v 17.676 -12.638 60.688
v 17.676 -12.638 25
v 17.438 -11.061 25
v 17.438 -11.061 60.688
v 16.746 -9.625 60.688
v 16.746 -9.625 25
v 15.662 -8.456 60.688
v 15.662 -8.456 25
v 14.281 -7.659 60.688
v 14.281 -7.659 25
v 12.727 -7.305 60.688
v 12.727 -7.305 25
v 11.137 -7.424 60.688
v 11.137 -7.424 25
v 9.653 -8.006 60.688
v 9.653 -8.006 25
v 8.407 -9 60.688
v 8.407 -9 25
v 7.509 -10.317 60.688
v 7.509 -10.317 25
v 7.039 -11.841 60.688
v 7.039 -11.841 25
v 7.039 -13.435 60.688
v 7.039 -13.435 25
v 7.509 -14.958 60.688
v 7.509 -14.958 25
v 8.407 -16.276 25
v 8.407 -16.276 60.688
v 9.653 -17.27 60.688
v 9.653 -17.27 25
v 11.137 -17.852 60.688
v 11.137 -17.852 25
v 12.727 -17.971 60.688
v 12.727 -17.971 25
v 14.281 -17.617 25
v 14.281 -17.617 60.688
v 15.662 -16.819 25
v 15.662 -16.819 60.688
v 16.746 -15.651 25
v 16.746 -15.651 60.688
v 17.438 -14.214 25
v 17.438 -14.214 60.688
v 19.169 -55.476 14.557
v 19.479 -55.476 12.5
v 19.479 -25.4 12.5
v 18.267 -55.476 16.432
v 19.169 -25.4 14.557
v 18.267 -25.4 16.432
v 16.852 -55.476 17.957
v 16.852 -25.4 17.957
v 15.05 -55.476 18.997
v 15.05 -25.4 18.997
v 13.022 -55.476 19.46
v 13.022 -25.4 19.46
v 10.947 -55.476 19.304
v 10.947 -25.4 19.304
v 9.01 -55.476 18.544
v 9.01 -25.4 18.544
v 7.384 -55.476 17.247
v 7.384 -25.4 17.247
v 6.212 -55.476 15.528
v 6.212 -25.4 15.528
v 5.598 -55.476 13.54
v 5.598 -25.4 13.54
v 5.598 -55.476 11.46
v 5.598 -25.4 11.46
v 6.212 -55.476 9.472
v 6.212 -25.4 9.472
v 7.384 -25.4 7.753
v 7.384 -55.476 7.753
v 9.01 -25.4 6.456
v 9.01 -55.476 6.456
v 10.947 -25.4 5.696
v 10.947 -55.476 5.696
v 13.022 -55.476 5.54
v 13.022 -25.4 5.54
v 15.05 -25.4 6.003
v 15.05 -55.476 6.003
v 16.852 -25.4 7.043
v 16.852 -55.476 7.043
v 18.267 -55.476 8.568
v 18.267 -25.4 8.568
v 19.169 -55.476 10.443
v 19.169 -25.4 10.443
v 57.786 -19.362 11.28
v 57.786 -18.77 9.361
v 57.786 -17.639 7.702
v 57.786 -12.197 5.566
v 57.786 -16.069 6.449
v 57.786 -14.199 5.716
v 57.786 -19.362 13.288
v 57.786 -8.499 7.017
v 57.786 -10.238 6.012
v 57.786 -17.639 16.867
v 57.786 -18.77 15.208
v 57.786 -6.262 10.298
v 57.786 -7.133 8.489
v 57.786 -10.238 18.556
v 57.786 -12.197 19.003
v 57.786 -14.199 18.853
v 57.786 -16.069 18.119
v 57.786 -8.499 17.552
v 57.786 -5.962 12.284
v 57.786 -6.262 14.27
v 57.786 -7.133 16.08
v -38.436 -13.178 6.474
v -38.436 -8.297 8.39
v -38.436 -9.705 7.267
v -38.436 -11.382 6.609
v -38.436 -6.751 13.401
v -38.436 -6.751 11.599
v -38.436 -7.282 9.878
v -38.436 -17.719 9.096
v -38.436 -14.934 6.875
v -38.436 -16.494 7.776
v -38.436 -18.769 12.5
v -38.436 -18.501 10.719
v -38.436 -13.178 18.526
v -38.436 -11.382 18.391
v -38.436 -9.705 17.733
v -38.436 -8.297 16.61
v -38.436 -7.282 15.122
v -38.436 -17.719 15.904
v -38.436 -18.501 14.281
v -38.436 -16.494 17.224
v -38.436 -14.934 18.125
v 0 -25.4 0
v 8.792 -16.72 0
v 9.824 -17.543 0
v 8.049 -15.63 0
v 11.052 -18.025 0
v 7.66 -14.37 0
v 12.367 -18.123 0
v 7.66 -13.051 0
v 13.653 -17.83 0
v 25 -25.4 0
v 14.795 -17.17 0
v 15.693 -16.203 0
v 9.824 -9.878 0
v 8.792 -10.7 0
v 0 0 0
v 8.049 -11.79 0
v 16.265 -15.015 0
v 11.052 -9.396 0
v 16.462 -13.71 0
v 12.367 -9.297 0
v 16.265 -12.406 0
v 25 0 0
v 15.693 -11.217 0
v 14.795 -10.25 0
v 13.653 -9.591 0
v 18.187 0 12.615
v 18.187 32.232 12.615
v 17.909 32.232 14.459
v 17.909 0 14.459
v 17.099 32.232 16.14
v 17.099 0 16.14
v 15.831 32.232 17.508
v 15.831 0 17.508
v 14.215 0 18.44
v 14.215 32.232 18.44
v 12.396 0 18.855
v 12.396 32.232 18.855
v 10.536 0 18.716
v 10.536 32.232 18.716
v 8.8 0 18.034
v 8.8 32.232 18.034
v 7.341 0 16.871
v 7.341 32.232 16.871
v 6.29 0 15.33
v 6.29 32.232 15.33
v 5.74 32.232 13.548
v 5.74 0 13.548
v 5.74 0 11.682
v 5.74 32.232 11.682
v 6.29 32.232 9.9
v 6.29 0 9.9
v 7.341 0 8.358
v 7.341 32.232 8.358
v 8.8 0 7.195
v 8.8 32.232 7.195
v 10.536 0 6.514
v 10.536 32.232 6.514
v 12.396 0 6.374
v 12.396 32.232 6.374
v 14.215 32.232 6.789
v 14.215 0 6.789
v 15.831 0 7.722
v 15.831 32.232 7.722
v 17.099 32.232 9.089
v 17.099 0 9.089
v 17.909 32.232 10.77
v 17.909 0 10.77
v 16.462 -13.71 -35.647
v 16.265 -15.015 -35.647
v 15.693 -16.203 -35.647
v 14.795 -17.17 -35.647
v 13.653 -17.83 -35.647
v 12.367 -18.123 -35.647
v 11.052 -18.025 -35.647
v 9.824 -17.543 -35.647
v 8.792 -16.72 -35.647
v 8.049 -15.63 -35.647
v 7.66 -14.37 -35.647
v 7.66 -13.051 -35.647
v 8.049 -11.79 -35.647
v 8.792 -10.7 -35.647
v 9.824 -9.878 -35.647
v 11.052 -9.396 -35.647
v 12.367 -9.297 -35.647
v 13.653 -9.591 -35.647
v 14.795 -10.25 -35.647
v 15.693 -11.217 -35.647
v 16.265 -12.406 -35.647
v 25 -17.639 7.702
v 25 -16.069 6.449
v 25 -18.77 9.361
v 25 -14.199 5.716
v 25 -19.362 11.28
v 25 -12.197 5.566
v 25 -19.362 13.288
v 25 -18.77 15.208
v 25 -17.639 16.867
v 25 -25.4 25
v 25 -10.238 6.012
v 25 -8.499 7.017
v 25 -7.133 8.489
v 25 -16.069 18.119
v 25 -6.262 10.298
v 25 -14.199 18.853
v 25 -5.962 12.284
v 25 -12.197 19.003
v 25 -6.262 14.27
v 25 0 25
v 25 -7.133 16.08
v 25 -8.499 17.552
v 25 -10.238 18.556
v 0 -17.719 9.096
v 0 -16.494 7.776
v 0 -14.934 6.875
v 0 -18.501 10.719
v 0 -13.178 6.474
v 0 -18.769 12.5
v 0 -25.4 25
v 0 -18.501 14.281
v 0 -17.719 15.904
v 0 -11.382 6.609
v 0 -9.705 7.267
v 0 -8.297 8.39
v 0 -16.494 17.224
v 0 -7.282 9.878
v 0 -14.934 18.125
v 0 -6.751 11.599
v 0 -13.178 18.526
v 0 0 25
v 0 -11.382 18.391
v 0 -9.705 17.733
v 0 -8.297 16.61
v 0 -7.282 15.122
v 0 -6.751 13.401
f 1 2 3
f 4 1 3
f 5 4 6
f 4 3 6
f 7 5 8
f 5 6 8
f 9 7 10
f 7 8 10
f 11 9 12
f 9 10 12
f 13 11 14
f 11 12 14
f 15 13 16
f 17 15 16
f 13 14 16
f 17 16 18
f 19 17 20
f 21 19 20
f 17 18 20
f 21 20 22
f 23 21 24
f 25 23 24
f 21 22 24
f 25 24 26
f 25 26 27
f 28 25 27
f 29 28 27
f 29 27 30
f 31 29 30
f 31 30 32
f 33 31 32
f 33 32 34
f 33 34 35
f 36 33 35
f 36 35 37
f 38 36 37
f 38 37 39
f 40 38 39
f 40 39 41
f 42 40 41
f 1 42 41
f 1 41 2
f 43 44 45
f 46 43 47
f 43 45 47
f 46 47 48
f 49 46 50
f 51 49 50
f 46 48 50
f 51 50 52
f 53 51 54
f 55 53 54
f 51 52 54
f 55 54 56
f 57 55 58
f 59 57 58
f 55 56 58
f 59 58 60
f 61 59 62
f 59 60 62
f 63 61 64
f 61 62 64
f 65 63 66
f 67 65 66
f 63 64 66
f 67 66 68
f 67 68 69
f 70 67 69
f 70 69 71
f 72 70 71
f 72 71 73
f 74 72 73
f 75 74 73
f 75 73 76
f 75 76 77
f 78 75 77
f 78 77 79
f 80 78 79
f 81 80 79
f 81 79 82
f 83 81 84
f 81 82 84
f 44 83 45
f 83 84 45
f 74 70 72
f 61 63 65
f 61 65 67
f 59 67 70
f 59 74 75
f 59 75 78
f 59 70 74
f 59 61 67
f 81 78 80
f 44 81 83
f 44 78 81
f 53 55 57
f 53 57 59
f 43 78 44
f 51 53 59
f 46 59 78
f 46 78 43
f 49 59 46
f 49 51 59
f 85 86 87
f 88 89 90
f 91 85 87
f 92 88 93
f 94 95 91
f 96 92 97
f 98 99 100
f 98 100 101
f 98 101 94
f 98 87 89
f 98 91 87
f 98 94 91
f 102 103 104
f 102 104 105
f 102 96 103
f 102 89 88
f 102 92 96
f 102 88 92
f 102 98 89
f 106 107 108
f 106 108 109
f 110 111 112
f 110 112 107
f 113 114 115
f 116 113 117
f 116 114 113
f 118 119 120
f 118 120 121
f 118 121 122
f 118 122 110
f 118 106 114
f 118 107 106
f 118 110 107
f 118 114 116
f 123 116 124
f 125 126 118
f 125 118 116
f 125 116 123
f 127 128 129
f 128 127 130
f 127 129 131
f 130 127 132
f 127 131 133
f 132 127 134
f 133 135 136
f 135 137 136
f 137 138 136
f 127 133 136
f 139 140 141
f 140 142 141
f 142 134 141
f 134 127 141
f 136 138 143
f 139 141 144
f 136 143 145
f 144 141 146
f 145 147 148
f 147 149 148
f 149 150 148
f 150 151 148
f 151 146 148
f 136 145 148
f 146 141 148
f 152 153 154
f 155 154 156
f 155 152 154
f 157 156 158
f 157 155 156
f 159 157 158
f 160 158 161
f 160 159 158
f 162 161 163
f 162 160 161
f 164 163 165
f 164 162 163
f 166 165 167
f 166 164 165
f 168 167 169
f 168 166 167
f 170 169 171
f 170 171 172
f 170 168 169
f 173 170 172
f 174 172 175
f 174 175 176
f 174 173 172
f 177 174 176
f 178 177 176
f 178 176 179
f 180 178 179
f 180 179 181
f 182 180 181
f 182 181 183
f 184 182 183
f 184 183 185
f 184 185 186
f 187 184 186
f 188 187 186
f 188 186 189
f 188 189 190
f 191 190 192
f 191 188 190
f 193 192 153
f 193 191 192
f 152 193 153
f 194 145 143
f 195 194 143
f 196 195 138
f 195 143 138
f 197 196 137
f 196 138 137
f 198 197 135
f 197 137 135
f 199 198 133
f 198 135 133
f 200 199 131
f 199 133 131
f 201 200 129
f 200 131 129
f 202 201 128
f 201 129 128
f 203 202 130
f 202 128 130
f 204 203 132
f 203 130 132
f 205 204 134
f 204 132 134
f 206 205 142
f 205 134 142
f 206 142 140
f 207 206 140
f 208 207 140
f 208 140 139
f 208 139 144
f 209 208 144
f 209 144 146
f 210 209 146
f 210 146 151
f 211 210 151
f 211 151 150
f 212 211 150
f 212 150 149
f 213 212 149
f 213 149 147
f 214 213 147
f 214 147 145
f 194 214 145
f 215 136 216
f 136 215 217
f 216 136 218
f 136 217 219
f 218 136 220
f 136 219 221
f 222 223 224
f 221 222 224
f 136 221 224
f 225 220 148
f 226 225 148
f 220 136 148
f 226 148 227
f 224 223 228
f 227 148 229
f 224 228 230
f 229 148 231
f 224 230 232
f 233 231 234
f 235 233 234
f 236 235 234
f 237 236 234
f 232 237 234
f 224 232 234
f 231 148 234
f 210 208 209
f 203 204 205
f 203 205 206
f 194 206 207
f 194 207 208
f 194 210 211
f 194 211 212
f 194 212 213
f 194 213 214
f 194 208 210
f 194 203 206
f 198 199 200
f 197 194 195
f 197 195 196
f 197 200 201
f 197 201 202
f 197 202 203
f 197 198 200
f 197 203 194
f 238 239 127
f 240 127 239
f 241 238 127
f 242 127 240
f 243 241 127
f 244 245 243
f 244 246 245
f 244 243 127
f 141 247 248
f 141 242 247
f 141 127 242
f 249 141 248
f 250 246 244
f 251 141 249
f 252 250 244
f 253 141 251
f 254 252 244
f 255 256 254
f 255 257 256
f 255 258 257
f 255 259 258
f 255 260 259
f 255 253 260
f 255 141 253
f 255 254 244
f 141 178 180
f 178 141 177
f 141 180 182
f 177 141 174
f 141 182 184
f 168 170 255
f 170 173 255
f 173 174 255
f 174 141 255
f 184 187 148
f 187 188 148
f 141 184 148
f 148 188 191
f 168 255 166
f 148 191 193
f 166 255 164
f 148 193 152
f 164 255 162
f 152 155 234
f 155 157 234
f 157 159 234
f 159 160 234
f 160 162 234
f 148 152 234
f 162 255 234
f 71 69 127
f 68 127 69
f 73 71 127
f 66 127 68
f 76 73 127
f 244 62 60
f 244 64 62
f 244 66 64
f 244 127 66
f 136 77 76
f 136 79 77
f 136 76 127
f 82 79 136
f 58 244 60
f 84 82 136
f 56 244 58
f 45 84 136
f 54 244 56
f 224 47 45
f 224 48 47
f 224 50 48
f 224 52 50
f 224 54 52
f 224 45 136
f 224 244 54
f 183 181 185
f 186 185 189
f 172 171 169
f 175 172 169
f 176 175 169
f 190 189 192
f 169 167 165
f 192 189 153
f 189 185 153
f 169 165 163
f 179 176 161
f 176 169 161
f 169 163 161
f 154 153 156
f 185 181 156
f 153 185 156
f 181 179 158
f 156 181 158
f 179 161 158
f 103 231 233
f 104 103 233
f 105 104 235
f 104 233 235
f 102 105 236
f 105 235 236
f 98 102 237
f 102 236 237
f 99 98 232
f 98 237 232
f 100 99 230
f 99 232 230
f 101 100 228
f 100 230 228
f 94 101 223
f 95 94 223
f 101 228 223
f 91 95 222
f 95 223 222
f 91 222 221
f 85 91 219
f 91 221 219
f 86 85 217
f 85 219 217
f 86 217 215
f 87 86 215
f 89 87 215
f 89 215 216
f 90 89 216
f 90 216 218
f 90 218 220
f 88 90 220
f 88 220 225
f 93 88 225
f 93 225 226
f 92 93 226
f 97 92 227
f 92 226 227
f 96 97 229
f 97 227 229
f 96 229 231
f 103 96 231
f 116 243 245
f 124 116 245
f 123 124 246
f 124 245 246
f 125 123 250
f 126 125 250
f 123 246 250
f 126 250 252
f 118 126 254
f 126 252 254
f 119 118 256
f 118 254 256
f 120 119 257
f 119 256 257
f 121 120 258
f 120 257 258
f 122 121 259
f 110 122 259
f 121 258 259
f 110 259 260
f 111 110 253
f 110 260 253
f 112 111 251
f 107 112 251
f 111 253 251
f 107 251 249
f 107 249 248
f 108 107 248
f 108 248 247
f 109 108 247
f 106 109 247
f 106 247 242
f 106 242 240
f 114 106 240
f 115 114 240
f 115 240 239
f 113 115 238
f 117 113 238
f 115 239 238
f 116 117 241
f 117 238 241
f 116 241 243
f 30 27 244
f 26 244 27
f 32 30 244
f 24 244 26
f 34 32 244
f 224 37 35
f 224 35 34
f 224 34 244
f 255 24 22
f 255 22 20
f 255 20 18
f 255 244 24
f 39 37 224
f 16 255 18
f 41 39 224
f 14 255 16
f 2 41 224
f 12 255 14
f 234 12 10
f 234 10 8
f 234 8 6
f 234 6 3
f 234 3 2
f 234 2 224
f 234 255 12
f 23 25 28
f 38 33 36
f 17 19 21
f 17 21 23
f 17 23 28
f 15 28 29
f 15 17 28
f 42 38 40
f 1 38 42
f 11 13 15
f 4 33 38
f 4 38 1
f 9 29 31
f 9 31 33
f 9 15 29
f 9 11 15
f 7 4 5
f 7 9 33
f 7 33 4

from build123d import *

# Parameters (mm, degrees)
F0_W      = 25
F0_H      = 25
F1_DEPTH  = 25.4
F2_R      = 5.34833
F3_DEPTH  = 60.688041
F5_R      = 4.425329
F6_DEPTH  = 35.64737
F4_R      = 5.771368
F7_DEPTH  = 5.648091
F8_R      = 6.258089
F9_DEPTH  = 32.231893
F10_R     = 6.97949
F11_DEPTH = 30.076189
F12_R     = 6.737557
F13_DEPTH = 32.785647
F14_R     = 6.042728
F15_DEPTH = 38.435884


with BuildPart() as f1:
    # F0 (on Front) → F1 (new body)
    with BuildSketch(Plane.XZ):
        with Locations((12.5, 12.5)):
            Rectangle(F0_W, F0_H)
    extrude(amount=F1_DEPTH)

    # F2 (on Top) → F3 (join)
    with BuildSketch(Plane.XY):
        with Locations((12.327284, -12.637898)):
            Circle(F2_R)
    extrude(amount=F3_DEPTH)

    # F5 (on face) → F6 (join)
    with BuildSketch(Plane(origin=(0, 0, 0), x_dir=(1, 0, 0), z_dir=(0, 0, -1))):
        with Locations((12.036352, 13.710335)):
            Circle(F5_R)
    extrude(amount=F6_DEPTH)

    # F4 (on Top) → F7 (join)
    with BuildSketch(Plane.XY):
        with Locations((11.907944, -12.260992)):
            Circle(F4_R)
    extrude(amount=F7_DEPTH)

    # F8 (on face) → F9 (join)
    with BuildSketch(Plane.XZ):
        with Locations((11.928667, 12.61479)):
            Circle(F8_R)
    extrude(amount=-F9_DEPTH)

    # F10 (on face) → F11 (join)
    with BuildSketch(Plane.XZ.offset(25.4)):
        with Locations((12.5, 12.5)):
            Circle(F10_R)
    extrude(amount=F11_DEPTH)

    # F12 (on face) → F13 (join)
    with BuildSketch(Plane.YZ.offset(25)):
        with Locations((-12.7, 12.28429)):
            Circle(F12_R)
    extrude(amount=F13_DEPTH)

    # F14 (on face) → F15 (join)
    with BuildSketch(Plane(origin=(0, 0, 0), x_dir=(0, -1, 0), z_dir=(-1, 0, 0))):
        with Locations((12.726512, 12.5)):
            Circle(F14_R)
    extrude(amount=F15_DEPTH)


solid = f1.part
